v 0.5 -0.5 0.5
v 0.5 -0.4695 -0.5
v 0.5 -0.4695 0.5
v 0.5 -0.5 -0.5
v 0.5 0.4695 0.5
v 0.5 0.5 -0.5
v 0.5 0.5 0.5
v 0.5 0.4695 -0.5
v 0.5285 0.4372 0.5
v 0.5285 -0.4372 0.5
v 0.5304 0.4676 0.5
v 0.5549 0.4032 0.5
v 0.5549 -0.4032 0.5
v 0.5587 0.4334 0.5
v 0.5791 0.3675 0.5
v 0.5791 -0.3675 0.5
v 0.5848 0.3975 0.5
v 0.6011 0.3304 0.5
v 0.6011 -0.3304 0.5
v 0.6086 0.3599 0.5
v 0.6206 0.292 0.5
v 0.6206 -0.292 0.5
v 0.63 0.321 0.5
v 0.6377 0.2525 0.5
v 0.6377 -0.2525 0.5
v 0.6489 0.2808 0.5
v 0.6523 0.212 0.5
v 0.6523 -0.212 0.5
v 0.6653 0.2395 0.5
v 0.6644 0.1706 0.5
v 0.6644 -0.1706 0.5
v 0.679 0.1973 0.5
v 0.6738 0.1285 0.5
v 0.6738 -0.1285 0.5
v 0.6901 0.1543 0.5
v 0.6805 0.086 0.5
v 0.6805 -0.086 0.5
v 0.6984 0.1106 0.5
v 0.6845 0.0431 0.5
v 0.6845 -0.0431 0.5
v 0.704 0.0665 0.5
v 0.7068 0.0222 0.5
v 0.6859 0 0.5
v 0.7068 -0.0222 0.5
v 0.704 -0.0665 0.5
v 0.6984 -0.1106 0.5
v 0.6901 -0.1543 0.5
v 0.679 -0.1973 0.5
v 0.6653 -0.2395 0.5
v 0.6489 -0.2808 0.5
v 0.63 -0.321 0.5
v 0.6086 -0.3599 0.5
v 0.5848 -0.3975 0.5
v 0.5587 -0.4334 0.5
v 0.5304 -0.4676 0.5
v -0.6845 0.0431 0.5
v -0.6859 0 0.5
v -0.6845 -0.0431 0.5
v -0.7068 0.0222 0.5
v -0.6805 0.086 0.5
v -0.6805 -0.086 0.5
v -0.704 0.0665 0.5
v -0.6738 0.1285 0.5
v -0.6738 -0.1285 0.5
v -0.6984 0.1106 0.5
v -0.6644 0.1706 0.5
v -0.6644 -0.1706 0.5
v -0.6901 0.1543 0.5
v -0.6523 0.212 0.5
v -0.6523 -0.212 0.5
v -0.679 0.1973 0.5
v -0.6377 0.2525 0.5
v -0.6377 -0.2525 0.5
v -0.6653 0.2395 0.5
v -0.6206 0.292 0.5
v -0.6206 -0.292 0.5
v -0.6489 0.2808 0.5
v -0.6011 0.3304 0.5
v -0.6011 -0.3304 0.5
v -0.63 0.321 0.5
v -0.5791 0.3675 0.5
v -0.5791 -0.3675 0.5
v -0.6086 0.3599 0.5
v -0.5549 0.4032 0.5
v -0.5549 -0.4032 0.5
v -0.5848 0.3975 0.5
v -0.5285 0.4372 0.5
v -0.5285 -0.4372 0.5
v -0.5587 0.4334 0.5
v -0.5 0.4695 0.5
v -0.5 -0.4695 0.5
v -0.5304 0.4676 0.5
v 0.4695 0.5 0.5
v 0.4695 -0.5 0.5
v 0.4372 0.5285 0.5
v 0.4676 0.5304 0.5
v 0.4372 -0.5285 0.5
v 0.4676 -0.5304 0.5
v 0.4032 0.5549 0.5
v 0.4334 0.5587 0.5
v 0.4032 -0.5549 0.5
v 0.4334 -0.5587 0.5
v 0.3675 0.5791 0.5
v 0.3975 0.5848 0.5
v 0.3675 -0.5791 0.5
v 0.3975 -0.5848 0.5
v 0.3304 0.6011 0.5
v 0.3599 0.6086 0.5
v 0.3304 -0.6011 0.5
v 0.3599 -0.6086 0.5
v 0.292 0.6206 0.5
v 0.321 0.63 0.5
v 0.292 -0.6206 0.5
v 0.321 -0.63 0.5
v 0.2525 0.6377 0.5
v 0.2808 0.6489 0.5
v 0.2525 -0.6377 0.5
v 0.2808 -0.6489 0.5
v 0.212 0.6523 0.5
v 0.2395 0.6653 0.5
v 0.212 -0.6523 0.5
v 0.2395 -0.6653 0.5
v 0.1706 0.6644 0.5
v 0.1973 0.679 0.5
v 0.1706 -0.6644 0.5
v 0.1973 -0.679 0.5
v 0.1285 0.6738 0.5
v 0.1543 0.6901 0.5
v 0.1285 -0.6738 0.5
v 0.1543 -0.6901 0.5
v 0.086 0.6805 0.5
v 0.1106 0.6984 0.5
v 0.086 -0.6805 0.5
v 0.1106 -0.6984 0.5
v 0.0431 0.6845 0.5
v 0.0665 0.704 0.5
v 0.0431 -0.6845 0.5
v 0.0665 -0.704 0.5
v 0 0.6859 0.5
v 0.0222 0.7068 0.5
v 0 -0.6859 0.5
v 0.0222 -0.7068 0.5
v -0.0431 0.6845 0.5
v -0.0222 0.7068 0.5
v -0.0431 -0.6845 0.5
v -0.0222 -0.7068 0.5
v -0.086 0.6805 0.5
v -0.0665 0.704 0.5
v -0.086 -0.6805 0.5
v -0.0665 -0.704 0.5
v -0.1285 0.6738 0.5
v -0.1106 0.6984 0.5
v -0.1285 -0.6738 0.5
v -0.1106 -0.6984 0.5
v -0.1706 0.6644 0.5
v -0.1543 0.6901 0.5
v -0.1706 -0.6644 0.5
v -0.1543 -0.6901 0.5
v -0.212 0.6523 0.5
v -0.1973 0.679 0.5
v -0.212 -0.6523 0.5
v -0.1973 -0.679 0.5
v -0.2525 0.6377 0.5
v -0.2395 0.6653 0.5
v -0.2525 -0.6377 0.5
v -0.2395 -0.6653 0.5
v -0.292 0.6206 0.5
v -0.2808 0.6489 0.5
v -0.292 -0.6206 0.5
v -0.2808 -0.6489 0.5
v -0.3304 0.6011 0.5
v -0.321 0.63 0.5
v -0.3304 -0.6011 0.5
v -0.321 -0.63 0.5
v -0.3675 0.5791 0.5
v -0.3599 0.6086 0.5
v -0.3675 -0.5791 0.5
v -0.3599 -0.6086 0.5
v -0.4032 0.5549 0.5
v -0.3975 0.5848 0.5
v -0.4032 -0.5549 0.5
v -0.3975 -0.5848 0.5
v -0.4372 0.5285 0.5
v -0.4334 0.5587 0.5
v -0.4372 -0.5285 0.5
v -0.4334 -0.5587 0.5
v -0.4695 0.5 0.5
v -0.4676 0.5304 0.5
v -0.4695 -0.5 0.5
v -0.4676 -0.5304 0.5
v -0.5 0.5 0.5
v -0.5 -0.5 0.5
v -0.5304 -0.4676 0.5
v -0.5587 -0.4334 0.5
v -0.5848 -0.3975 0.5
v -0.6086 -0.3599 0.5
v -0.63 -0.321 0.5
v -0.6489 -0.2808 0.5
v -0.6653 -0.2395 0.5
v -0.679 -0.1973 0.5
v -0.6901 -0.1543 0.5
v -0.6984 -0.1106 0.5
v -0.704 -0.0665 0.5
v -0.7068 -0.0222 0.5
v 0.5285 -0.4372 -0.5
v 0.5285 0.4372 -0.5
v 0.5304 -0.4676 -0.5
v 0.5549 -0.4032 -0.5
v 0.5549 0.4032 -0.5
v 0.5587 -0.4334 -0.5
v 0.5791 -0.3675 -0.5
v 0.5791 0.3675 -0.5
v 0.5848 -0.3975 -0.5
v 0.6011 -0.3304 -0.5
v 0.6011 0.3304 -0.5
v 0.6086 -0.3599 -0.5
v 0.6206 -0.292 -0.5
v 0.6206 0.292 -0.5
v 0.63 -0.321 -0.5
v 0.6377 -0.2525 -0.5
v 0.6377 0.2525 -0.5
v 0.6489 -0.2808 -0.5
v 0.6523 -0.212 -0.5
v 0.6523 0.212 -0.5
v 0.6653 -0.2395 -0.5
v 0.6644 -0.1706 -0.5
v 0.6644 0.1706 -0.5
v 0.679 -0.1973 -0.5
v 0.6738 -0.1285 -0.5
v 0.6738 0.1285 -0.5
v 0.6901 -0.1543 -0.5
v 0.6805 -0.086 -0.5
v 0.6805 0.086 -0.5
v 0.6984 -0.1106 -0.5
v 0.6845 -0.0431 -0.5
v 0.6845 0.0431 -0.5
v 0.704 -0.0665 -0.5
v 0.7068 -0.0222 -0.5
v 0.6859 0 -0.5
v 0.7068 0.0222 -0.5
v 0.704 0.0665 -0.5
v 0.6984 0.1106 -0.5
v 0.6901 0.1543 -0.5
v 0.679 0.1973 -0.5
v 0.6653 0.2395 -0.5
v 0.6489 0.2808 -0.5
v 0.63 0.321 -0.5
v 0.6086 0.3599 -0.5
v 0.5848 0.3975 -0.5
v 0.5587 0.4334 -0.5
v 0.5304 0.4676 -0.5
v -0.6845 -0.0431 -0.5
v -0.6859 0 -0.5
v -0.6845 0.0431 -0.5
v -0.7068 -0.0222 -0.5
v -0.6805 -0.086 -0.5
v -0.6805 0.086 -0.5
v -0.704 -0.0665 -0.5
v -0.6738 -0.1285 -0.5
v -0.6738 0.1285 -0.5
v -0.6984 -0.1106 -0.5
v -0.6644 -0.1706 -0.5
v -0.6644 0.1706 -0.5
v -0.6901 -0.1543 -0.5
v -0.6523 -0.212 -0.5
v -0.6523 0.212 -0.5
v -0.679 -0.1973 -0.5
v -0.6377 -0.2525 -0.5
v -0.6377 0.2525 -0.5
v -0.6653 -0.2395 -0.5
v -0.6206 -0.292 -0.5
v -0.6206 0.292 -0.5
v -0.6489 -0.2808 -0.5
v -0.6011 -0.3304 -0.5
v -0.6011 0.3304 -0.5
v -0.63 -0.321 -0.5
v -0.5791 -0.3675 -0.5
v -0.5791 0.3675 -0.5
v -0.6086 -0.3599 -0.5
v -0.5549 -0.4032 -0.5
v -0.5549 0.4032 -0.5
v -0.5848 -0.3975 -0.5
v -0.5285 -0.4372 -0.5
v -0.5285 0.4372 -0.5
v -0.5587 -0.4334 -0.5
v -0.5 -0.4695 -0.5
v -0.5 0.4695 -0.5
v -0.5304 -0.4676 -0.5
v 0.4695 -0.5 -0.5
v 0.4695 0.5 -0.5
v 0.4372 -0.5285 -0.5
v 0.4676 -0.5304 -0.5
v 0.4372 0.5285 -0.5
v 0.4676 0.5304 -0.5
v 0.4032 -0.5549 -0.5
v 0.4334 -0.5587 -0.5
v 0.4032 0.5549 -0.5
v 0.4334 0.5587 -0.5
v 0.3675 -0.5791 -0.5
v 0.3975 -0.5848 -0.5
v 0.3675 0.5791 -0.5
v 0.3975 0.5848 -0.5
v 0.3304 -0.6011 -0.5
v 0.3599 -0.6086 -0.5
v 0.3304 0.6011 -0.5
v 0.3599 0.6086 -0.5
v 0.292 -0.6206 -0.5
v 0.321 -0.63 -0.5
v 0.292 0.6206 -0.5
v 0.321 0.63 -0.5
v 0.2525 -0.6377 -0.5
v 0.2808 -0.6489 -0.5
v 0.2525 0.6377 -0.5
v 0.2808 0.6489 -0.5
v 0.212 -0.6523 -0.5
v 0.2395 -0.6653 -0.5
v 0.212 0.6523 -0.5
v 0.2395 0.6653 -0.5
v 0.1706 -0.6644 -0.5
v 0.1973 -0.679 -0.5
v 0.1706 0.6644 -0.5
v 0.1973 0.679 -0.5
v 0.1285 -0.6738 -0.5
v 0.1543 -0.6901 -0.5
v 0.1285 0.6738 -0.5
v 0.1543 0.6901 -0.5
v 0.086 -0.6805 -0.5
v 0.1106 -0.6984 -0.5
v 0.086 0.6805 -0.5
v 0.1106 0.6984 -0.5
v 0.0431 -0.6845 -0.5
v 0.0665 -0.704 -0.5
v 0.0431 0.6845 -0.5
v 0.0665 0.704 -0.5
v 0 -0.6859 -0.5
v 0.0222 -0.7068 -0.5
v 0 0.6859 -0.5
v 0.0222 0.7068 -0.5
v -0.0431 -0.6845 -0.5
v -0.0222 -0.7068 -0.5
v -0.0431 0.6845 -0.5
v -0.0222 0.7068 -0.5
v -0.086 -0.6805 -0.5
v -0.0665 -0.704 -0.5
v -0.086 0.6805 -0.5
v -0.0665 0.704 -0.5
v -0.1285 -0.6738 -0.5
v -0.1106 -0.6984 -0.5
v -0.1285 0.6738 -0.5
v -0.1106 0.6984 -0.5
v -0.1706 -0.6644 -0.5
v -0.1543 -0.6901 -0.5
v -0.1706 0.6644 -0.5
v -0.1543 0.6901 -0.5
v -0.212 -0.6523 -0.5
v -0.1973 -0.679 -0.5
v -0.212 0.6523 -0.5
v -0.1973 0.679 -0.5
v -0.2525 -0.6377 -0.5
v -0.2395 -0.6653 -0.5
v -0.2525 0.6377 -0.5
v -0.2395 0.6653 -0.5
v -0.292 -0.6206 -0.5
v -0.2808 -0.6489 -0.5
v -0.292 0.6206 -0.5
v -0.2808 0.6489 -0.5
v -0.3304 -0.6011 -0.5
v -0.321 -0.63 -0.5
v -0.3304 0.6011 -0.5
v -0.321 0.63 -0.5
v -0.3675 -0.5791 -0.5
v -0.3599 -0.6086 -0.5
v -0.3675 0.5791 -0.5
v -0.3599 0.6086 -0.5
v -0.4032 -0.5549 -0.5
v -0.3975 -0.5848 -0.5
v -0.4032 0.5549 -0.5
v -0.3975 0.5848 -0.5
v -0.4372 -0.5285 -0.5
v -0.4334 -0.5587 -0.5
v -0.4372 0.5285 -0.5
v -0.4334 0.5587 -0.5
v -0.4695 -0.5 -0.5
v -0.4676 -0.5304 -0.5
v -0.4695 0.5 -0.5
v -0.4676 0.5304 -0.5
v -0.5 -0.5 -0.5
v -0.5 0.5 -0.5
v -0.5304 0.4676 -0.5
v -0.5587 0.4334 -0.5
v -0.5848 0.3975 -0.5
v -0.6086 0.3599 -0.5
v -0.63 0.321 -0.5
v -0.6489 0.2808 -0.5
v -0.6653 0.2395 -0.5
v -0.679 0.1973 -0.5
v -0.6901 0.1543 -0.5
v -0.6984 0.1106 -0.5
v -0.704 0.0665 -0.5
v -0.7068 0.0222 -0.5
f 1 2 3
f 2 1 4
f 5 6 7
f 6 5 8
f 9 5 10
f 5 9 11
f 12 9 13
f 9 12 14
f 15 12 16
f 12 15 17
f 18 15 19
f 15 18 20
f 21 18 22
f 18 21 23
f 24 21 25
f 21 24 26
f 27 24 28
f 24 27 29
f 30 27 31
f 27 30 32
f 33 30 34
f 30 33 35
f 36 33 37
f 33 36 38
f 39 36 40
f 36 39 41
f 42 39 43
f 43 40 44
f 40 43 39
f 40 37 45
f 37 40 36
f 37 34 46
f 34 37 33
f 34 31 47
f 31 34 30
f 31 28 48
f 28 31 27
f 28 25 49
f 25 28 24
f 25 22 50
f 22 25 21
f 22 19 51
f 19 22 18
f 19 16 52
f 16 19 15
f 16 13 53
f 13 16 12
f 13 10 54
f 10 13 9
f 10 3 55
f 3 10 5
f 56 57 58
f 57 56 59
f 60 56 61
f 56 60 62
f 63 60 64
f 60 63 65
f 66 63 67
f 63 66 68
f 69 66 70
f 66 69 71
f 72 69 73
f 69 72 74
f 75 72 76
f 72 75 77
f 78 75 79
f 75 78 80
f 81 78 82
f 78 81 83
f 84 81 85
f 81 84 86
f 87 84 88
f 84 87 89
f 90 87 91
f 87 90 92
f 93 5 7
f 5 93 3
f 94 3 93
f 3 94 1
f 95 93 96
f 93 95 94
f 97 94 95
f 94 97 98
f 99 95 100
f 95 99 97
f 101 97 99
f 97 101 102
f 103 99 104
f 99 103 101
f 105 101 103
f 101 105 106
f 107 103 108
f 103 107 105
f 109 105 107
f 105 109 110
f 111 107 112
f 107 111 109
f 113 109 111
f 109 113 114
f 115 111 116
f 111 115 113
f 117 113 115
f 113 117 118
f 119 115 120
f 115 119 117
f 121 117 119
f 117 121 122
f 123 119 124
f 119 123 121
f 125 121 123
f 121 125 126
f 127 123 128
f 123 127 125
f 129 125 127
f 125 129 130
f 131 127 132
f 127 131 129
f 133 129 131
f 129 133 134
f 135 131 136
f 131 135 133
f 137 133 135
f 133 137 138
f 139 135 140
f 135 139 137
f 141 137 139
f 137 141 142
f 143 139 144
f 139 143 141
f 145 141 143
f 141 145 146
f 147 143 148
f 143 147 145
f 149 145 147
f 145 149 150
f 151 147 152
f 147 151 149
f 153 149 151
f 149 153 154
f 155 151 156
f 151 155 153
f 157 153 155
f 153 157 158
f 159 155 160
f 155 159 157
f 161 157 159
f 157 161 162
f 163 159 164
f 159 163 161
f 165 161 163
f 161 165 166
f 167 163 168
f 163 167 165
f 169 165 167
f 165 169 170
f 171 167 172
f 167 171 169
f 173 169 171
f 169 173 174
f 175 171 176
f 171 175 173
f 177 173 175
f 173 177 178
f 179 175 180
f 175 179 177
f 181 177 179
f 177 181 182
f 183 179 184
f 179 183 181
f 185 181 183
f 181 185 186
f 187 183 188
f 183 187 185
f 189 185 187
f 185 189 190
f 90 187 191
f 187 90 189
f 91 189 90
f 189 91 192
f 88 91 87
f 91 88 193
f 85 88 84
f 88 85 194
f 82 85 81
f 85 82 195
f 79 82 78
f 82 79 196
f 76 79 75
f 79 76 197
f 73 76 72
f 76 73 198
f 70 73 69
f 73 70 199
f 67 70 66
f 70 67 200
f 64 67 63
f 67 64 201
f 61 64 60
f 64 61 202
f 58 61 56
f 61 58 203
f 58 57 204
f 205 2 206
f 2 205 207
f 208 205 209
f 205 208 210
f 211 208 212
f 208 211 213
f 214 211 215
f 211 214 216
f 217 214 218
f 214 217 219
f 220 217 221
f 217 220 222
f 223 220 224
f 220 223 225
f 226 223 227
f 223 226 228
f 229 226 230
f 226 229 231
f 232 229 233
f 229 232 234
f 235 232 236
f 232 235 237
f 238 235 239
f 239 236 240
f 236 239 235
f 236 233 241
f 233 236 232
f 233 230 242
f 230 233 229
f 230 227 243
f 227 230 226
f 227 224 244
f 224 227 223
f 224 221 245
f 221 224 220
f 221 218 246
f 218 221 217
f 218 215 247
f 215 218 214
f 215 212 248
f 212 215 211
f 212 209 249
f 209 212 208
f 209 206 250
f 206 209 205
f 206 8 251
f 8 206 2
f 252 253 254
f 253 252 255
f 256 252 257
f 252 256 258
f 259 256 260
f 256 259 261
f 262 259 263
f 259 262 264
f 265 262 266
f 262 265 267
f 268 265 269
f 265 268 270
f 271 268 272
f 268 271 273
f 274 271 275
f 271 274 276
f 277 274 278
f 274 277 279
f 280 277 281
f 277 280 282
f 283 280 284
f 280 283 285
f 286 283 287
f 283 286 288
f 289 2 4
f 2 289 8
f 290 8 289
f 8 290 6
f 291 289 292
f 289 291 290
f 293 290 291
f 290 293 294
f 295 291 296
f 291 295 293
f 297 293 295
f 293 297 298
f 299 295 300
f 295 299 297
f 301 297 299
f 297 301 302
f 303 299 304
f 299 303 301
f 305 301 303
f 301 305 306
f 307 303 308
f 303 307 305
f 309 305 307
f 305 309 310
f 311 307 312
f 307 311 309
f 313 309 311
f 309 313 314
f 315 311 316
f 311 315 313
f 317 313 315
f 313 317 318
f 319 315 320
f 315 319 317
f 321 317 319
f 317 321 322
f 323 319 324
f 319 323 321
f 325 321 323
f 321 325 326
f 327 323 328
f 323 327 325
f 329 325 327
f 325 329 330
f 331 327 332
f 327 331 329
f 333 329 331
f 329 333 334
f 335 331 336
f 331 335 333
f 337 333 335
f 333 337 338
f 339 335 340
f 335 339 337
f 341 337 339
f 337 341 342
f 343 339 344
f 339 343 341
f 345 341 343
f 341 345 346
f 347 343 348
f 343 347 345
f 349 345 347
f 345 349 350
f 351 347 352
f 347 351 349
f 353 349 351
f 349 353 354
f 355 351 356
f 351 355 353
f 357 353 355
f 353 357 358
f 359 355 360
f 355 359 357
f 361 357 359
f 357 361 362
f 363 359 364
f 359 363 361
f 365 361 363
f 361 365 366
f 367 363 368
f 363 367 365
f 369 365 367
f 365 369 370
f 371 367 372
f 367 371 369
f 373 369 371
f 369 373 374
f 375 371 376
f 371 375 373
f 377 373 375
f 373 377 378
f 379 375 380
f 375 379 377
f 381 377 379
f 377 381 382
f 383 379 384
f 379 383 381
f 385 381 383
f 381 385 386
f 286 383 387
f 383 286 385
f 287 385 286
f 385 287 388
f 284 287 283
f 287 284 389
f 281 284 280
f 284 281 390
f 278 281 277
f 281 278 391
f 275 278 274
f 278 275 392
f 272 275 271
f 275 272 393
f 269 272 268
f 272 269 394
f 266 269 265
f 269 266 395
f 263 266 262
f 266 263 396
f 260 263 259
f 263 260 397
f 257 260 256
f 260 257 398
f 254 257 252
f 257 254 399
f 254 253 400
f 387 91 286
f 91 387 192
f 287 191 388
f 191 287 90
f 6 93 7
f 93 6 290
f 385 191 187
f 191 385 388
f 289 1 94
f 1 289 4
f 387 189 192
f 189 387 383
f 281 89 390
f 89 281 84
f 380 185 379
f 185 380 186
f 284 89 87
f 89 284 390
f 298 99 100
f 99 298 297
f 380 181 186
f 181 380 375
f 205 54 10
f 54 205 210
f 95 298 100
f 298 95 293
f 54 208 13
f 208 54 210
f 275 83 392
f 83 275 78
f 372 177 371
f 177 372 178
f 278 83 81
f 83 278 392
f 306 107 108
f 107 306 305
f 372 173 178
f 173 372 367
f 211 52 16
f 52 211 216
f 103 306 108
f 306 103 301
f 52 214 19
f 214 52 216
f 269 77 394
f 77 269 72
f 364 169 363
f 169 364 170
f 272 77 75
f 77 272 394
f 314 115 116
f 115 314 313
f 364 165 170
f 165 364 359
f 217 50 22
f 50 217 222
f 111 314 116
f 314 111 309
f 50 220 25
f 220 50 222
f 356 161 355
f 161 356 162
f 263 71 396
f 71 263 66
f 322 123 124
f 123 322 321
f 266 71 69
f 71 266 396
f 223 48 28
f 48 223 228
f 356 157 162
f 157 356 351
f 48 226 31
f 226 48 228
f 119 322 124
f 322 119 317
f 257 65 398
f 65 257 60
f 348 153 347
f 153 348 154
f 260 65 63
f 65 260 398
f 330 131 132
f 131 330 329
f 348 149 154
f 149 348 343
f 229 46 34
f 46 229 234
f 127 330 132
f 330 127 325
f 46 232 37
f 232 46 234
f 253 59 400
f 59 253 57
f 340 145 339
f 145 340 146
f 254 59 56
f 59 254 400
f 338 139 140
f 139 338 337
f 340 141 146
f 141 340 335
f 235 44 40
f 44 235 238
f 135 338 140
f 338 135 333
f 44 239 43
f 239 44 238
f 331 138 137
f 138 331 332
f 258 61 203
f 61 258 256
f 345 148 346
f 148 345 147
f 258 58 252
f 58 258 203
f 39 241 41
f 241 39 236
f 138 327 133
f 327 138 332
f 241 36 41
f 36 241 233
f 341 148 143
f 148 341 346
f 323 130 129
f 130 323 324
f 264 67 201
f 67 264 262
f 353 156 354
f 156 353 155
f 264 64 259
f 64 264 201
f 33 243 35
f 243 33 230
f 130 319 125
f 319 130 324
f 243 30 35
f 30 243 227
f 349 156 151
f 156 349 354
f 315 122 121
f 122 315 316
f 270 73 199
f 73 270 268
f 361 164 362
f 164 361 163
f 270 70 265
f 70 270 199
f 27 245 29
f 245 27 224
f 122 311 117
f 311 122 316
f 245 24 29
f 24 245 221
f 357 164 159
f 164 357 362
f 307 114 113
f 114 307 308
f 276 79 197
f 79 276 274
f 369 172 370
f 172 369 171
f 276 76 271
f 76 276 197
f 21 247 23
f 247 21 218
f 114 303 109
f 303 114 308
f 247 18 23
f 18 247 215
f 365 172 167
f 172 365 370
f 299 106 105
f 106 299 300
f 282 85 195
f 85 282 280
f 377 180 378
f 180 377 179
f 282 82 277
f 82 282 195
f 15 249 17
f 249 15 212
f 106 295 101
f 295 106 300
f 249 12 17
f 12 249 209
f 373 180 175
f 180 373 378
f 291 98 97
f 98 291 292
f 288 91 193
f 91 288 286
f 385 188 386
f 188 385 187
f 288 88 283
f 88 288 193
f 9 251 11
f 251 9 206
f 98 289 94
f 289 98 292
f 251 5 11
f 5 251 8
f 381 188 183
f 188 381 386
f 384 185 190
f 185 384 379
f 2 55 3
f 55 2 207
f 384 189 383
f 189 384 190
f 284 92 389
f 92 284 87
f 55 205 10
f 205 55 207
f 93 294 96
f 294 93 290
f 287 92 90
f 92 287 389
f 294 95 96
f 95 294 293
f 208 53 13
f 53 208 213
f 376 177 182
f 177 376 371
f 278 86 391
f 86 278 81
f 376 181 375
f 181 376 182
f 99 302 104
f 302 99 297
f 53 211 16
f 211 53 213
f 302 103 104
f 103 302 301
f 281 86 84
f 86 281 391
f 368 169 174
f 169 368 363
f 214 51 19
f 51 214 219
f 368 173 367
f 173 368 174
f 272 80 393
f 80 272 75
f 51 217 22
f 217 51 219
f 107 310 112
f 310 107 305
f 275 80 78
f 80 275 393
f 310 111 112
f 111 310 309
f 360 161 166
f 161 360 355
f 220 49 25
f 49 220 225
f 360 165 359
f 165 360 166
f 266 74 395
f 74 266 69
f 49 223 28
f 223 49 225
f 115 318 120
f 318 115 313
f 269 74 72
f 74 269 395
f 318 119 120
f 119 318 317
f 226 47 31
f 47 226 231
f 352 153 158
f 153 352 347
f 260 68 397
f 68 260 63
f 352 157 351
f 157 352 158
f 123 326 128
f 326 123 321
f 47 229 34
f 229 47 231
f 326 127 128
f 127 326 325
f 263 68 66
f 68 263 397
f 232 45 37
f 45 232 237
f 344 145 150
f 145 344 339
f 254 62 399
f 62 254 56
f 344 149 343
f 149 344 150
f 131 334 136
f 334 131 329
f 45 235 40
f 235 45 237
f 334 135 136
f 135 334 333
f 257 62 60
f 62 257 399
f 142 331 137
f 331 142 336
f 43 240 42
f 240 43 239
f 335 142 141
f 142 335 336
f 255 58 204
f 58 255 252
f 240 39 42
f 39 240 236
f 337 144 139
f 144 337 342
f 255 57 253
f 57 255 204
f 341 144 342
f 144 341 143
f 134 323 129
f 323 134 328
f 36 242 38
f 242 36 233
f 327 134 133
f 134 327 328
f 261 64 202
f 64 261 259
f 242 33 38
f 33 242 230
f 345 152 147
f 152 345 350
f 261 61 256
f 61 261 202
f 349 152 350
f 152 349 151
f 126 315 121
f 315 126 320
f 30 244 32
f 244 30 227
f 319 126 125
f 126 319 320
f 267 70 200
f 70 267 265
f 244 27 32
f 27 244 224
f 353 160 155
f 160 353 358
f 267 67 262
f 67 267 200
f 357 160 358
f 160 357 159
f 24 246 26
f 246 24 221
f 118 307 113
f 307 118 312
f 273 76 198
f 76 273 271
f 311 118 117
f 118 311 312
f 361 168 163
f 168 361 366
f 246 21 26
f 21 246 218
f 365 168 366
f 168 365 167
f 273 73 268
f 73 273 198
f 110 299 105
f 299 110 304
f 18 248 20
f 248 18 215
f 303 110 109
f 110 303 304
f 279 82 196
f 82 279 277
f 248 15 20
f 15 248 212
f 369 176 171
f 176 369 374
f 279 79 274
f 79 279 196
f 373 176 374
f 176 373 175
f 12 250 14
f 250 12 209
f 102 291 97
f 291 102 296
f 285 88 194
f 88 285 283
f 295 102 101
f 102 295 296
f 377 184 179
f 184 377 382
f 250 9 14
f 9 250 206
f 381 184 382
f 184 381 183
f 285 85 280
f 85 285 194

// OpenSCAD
module multi_rot_cube(N=10) {
   alpha=360/N;
   union() {
      for(i=[0:N-1]) {
         rotate(i*alpha)
            cube(center=true);
      }
   }
}


multi_rot_cube(N=50);

   
